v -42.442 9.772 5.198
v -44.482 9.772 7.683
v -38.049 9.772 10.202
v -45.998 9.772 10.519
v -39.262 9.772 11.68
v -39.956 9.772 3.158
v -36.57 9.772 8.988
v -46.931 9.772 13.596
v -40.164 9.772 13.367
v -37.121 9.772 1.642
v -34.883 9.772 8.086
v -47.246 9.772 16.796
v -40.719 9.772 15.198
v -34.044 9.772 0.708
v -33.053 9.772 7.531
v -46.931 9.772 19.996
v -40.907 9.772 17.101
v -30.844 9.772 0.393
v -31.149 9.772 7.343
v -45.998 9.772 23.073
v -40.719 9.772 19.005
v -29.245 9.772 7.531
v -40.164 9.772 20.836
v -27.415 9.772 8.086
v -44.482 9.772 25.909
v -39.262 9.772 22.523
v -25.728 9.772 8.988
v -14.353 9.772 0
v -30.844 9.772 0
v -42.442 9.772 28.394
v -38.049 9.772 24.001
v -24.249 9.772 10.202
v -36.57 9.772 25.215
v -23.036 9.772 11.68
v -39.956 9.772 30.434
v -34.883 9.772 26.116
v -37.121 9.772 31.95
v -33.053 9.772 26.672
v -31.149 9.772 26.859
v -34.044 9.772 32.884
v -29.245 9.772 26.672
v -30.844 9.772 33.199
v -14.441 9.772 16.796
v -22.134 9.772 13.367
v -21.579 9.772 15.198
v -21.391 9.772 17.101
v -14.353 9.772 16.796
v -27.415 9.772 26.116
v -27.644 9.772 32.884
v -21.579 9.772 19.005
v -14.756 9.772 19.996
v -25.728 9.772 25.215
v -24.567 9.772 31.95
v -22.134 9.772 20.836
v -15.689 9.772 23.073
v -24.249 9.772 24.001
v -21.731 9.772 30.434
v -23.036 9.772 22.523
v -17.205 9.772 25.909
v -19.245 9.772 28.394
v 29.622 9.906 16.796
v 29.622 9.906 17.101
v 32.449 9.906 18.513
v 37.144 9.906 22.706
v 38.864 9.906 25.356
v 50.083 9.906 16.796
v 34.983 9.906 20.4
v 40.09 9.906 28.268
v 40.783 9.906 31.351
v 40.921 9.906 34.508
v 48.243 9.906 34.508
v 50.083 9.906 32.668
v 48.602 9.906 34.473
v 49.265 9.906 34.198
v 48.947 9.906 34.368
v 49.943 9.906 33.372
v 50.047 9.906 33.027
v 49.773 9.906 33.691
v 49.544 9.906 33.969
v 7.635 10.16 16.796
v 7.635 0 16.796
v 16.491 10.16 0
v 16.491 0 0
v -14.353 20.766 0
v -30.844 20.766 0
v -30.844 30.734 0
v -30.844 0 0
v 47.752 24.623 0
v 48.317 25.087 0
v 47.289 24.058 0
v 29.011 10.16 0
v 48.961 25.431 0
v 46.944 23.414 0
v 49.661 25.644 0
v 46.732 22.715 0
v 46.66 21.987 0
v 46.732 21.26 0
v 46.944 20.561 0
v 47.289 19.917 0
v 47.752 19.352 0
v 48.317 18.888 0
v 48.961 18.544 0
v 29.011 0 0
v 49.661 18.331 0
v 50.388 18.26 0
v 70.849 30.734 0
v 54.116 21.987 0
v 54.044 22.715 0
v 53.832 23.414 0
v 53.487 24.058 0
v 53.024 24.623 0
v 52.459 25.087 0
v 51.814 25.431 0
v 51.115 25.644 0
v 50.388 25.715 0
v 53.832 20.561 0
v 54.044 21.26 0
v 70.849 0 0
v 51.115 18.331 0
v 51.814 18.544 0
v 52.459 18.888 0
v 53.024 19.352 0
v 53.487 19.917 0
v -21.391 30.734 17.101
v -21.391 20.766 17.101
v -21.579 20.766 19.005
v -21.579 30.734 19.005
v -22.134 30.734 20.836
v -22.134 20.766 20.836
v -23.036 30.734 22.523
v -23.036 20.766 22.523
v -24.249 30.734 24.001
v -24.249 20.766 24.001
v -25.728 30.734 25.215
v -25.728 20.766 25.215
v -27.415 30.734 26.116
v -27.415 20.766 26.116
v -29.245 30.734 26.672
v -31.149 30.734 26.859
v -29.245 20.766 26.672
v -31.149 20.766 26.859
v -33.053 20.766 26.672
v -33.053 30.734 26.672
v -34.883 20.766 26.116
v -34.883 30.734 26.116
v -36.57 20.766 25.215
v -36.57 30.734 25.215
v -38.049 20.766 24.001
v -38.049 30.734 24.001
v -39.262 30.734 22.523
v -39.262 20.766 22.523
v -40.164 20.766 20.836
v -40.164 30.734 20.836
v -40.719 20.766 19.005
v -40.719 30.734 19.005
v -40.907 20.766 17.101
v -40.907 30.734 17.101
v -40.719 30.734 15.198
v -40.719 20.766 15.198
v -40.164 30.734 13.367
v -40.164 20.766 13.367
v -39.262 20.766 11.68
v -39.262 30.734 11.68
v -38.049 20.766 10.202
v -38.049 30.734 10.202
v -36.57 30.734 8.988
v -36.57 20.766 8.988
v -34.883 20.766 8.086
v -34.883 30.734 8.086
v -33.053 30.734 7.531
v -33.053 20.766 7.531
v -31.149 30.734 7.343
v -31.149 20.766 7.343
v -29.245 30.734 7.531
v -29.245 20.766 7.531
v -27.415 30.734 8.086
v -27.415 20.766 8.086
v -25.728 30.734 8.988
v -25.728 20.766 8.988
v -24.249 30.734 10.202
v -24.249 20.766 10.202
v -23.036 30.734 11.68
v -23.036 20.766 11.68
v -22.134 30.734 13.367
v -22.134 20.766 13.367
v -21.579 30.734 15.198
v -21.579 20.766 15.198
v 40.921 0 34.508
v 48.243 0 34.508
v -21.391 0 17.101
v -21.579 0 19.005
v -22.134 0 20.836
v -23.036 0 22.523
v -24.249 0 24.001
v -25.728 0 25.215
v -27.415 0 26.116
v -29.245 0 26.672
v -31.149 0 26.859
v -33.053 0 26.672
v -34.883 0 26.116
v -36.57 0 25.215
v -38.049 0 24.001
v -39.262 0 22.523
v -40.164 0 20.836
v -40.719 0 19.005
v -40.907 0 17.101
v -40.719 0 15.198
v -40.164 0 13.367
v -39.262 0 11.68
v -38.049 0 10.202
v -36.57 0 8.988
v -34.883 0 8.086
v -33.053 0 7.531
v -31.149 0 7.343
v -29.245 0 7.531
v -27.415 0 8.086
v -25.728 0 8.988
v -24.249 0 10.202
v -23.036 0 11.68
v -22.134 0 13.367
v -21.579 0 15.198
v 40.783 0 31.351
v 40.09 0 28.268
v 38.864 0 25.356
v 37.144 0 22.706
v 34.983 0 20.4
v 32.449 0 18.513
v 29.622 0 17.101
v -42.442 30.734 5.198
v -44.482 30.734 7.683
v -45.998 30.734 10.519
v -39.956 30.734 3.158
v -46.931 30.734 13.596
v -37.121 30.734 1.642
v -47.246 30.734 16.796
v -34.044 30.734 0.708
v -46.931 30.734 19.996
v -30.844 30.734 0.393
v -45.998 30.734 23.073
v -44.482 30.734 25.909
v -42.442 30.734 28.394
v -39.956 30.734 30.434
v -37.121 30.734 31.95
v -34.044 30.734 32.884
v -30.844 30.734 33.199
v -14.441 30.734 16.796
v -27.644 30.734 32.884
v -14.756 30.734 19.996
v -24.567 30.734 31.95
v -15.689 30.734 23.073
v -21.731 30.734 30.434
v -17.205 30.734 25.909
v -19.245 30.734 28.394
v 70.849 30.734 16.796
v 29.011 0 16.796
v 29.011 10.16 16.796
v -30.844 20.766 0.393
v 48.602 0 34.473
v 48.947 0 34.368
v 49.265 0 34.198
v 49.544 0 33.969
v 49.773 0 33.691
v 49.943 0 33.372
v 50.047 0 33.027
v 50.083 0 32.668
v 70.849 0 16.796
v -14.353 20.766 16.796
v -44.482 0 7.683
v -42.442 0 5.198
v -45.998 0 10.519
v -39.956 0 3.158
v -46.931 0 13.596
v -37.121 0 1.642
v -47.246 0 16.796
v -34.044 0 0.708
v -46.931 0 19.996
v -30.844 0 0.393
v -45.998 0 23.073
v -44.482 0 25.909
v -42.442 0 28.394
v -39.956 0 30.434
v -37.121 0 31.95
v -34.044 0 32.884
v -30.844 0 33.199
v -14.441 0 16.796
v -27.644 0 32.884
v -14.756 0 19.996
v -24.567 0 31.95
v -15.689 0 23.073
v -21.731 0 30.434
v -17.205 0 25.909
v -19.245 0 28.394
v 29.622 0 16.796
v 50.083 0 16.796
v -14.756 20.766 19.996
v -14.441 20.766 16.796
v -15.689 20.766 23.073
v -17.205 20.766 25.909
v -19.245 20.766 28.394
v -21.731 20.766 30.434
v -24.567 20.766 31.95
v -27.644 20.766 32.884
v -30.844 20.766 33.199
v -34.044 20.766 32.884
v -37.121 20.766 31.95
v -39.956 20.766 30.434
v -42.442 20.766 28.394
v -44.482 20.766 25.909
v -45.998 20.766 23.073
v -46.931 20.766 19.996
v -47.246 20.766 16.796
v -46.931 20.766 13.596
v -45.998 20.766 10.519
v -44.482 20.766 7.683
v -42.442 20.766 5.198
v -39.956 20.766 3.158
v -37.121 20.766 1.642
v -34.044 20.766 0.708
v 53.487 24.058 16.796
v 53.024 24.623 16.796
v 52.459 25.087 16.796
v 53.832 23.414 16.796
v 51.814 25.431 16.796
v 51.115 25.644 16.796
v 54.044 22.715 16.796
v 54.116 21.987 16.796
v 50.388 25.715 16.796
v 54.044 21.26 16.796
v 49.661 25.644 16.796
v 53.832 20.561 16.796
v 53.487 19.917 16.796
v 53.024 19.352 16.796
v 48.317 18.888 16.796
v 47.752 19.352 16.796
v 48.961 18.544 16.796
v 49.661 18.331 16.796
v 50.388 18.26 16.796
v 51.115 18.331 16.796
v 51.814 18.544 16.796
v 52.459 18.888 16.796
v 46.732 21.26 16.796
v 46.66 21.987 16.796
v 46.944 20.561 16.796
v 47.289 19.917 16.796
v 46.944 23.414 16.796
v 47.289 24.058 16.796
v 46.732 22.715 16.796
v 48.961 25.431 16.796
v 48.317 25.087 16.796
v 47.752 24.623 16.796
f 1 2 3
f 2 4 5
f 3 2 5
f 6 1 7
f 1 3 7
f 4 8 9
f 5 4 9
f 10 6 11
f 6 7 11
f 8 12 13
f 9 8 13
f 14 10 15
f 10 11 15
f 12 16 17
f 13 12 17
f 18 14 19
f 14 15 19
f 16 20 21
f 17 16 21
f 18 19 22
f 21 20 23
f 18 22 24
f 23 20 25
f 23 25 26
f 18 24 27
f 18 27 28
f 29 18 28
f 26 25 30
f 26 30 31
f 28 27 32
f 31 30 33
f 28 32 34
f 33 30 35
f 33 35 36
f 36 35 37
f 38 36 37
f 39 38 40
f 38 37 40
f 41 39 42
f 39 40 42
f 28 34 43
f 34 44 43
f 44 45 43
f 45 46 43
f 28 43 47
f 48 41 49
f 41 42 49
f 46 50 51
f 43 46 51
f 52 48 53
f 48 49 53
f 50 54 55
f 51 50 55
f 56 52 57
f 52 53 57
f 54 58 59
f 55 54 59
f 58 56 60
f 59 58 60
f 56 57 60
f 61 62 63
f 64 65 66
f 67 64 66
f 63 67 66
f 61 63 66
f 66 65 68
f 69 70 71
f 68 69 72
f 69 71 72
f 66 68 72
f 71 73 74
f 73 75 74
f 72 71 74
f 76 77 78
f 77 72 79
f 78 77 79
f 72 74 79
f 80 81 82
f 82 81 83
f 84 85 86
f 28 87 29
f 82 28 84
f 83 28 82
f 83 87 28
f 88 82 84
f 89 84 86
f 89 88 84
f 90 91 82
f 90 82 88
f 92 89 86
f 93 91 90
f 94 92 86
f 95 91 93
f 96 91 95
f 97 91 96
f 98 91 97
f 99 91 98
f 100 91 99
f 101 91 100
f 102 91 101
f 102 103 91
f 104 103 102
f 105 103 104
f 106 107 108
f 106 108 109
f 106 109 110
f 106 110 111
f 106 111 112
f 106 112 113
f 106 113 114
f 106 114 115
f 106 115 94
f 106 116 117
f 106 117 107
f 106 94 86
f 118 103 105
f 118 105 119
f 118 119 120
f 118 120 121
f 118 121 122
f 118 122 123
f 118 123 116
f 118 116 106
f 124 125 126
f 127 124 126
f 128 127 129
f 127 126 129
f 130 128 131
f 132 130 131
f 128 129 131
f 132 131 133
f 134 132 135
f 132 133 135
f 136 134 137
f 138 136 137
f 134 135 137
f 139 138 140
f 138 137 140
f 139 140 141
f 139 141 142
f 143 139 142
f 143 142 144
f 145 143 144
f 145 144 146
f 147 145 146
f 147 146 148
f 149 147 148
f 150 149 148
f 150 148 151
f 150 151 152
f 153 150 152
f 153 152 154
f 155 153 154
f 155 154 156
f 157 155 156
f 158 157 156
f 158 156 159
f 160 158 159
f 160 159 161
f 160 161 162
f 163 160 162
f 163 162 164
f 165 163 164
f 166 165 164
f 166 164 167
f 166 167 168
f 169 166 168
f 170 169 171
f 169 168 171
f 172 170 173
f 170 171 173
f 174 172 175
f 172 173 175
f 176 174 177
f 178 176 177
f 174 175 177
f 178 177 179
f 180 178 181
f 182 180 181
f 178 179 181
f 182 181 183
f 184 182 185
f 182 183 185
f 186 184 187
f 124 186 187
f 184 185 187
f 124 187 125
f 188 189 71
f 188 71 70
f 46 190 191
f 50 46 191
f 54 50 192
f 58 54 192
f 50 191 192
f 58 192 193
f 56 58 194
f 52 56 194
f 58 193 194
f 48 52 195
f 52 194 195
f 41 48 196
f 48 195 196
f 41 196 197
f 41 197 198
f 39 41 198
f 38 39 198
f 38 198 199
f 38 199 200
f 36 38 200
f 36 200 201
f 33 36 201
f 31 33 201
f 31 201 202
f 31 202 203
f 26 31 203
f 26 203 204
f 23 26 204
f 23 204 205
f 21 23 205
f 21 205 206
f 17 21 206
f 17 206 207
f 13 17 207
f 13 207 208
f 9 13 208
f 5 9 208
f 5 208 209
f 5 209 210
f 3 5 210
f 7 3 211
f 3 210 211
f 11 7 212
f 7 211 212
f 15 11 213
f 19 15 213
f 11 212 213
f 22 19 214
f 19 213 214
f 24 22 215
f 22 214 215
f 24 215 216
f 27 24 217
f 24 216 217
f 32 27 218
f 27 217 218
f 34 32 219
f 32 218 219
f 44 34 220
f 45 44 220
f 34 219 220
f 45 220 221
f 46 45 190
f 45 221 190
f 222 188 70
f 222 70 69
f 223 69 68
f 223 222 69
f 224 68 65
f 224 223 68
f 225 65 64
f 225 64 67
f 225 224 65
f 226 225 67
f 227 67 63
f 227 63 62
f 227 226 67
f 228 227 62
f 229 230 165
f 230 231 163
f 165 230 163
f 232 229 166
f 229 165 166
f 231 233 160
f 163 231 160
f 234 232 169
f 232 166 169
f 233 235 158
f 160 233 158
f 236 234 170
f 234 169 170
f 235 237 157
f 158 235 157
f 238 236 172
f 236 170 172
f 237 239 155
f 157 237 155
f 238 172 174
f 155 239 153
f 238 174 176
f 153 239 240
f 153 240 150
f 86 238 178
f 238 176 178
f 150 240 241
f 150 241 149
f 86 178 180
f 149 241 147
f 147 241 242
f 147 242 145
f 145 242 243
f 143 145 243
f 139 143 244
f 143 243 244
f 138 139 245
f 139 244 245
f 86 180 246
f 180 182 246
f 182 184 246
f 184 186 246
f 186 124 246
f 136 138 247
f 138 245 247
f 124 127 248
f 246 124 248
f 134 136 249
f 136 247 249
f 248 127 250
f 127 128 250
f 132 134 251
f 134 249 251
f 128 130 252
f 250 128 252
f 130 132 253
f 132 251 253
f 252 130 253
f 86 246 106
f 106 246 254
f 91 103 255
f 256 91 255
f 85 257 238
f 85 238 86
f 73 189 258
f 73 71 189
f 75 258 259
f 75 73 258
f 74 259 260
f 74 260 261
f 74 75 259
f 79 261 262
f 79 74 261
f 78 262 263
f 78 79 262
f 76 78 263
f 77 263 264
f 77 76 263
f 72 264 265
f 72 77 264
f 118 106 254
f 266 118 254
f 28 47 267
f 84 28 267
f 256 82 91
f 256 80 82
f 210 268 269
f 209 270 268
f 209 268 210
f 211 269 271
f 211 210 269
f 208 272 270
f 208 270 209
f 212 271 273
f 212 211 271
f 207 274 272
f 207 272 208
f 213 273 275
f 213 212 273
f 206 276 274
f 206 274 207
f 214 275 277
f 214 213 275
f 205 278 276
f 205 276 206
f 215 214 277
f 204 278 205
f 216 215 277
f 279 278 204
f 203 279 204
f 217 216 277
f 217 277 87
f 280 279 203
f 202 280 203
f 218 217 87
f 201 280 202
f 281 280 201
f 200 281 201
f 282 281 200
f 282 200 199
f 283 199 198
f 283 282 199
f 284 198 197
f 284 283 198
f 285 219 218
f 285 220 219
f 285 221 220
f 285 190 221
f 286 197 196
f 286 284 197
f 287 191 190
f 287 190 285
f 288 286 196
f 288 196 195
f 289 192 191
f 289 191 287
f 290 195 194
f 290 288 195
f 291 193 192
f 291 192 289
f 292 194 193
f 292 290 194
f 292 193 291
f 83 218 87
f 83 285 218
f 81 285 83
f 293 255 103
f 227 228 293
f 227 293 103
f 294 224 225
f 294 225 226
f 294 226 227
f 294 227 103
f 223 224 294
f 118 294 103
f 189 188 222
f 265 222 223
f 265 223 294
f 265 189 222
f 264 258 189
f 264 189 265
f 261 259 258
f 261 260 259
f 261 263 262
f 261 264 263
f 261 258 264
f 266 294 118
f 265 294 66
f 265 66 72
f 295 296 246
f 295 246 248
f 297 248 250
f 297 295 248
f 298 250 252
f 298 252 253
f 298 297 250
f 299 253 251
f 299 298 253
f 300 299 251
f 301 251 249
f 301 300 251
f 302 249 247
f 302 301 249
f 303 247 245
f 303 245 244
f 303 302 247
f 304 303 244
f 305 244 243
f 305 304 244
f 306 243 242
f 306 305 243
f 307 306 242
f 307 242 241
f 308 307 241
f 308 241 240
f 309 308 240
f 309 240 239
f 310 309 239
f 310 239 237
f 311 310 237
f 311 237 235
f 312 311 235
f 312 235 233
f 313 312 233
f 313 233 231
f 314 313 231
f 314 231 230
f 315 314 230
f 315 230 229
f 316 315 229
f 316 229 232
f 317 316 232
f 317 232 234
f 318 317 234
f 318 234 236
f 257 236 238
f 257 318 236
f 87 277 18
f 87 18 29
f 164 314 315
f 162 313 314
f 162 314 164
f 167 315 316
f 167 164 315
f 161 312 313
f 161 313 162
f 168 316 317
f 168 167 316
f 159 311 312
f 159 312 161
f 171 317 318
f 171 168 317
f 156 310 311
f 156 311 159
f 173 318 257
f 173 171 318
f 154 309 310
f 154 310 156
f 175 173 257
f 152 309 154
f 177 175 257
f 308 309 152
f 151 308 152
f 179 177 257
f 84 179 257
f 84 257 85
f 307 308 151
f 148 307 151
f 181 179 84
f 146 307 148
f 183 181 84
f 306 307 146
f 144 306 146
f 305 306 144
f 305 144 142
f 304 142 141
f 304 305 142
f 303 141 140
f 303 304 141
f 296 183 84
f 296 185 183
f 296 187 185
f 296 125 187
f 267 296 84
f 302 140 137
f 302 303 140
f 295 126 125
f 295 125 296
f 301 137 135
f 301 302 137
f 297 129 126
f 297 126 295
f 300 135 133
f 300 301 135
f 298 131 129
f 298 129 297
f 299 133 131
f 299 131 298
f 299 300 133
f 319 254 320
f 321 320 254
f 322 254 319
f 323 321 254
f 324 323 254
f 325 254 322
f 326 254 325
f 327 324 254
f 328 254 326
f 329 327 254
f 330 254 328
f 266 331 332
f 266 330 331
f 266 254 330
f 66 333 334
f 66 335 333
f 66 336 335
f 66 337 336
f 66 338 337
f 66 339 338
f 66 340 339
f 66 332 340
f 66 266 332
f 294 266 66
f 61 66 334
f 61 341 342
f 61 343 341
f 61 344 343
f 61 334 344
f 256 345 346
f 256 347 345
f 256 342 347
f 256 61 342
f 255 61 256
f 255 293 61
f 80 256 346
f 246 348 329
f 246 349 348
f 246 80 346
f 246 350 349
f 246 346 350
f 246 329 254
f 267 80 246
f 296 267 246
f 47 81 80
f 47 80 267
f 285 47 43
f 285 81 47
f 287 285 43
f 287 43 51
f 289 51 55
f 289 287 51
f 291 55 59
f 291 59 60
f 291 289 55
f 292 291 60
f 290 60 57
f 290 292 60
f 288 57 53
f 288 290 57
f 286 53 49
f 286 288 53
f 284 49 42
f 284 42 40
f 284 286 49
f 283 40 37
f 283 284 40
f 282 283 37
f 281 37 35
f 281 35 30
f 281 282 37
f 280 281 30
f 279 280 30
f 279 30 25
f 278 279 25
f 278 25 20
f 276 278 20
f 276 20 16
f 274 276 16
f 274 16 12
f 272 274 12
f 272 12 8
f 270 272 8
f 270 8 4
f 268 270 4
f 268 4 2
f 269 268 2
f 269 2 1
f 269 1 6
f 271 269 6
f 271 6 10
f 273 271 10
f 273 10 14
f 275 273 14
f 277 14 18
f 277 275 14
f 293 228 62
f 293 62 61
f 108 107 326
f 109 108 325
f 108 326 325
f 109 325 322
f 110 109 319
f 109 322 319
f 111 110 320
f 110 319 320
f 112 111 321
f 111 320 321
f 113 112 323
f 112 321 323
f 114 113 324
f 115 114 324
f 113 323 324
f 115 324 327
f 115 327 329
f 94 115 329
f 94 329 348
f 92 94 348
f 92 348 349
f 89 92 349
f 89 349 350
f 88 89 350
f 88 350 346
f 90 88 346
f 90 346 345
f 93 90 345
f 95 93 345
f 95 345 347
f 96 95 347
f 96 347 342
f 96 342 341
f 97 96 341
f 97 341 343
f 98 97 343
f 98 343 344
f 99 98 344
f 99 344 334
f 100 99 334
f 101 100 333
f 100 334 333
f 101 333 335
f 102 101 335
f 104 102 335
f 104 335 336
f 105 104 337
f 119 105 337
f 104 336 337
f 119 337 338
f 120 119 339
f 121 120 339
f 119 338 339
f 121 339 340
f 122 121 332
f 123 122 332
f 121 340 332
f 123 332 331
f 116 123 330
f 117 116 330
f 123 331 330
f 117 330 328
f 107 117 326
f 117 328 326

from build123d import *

# Parameters (mm, degrees)
F1_DEPTH  = 30.734
F3_W      = 32.981223
F3_H      = 10.993741
F4_DEPTH  = 53.848
F5_R      = 9.757889
F6_DEPTH  = 53.086
F8_DEPTH  = 9.906
F9_R      = 1.839631
F11_DEPTH = 10.16
F12_R     = 3.72766
F13_DEPTH = 25.4


with BuildPart() as f1:
    # F0 (on Front) → F1 (new body)
    with BuildSketch(Plane.XZ):
        with BuildLine():
            ThreePointArc((-30.84355, 0.39327), (-19.245074, 5.197517), (-14.440828, 16.795993))
            Line((-14.440828, 16.795993), (-30.84355, 16.795993))
            Line((-30.84355, 16.795993), (-30.84355, 0.39327))
        make_face()
        with BuildLine():
            Line((-30.84355, 16.795993), (-14.440828, 16.795993))
            ThreePointArc((-14.440828, 16.795993), (-42.442027, 28.394469), (-30.84355, 0.39327))
            Line((-30.84355, 0.39327), (-30.84355, 16.795993))
        make_face()
        with BuildLine():
            Line((70.848547, 16.795993), (-14.440828, 16.795993))
            ThreePointArc((-14.440828, 16.795993), (-19.245074, 5.197517), (-30.84355, 0.39327))
            Line((-30.84355, 0.39327), (-30.84355, 0))
            Line((-30.84355, 0), (70.848547, 0))
            Line((70.848547, 0), (70.848547, 16.795993))
        make_face()
    extrude(amount=-F1_DEPTH)

    # F3 (on offset) → F4 (cut)
    with BuildSketch(Plane.XY.offset(34.29)):
        with Locations((-30.843549, 15.269084)):
            Rectangle(F3_W, F3_H)
    extrude(amount=-F4_DEPTH, mode=Mode.SUBTRACT)

    # F5 (on Front) → F6 (cut)
    with BuildSketch(Plane.XZ):
        with Locations((-31.148931, 17.101374)):
            Circle(F5_R)
    extrude(amount=-F6_DEPTH, mode=Mode.SUBTRACT)

    # F7 (on Front) → F8 (join)
    with BuildSketch(Plane.XZ):
        with BuildLine():
            Line((29.622022, 17.101374), (29.622022, 0))
            Line((29.622022, 0), (50.082598, 0))
            Line((50.082598, 0), (50.082598, 34.508131))
            Line((50.082598, 34.508131), (40.921144, 34.508131))
            ThreePointArc((40.921144, 34.508131), (38.063066, 23.992738), (29.622022, 17.101374))
        make_face()
    extrude(amount=-F8_DEPTH)

    # F9
    f9_edges = [f1.edges().sort_by_distance(p)[0] for p in [
        (50.082598, 4.953, 34.508131),
    ]]
    fillet(f9_edges, radius=F9_R)

    # F10 (on Front) → F11 (cut)
    with BuildSketch(Plane.XZ):
        Polygon((29.011261, 0), (29.011261, 17.101374), (7.634541, 16.795993), (16.49061, 0), align=None)
    extrude(amount=-F11_DEPTH, mode=Mode.SUBTRACT)

    # F12 (on face) → F13 (cut)
    with BuildSketch(Plane.XY.offset(16.795993)):
        with Locations((50.387979, 21.987481)):
            Circle(F12_R)
    extrude(amount=-F13_DEPTH, mode=Mode.SUBTRACT)


solid = f1.part
